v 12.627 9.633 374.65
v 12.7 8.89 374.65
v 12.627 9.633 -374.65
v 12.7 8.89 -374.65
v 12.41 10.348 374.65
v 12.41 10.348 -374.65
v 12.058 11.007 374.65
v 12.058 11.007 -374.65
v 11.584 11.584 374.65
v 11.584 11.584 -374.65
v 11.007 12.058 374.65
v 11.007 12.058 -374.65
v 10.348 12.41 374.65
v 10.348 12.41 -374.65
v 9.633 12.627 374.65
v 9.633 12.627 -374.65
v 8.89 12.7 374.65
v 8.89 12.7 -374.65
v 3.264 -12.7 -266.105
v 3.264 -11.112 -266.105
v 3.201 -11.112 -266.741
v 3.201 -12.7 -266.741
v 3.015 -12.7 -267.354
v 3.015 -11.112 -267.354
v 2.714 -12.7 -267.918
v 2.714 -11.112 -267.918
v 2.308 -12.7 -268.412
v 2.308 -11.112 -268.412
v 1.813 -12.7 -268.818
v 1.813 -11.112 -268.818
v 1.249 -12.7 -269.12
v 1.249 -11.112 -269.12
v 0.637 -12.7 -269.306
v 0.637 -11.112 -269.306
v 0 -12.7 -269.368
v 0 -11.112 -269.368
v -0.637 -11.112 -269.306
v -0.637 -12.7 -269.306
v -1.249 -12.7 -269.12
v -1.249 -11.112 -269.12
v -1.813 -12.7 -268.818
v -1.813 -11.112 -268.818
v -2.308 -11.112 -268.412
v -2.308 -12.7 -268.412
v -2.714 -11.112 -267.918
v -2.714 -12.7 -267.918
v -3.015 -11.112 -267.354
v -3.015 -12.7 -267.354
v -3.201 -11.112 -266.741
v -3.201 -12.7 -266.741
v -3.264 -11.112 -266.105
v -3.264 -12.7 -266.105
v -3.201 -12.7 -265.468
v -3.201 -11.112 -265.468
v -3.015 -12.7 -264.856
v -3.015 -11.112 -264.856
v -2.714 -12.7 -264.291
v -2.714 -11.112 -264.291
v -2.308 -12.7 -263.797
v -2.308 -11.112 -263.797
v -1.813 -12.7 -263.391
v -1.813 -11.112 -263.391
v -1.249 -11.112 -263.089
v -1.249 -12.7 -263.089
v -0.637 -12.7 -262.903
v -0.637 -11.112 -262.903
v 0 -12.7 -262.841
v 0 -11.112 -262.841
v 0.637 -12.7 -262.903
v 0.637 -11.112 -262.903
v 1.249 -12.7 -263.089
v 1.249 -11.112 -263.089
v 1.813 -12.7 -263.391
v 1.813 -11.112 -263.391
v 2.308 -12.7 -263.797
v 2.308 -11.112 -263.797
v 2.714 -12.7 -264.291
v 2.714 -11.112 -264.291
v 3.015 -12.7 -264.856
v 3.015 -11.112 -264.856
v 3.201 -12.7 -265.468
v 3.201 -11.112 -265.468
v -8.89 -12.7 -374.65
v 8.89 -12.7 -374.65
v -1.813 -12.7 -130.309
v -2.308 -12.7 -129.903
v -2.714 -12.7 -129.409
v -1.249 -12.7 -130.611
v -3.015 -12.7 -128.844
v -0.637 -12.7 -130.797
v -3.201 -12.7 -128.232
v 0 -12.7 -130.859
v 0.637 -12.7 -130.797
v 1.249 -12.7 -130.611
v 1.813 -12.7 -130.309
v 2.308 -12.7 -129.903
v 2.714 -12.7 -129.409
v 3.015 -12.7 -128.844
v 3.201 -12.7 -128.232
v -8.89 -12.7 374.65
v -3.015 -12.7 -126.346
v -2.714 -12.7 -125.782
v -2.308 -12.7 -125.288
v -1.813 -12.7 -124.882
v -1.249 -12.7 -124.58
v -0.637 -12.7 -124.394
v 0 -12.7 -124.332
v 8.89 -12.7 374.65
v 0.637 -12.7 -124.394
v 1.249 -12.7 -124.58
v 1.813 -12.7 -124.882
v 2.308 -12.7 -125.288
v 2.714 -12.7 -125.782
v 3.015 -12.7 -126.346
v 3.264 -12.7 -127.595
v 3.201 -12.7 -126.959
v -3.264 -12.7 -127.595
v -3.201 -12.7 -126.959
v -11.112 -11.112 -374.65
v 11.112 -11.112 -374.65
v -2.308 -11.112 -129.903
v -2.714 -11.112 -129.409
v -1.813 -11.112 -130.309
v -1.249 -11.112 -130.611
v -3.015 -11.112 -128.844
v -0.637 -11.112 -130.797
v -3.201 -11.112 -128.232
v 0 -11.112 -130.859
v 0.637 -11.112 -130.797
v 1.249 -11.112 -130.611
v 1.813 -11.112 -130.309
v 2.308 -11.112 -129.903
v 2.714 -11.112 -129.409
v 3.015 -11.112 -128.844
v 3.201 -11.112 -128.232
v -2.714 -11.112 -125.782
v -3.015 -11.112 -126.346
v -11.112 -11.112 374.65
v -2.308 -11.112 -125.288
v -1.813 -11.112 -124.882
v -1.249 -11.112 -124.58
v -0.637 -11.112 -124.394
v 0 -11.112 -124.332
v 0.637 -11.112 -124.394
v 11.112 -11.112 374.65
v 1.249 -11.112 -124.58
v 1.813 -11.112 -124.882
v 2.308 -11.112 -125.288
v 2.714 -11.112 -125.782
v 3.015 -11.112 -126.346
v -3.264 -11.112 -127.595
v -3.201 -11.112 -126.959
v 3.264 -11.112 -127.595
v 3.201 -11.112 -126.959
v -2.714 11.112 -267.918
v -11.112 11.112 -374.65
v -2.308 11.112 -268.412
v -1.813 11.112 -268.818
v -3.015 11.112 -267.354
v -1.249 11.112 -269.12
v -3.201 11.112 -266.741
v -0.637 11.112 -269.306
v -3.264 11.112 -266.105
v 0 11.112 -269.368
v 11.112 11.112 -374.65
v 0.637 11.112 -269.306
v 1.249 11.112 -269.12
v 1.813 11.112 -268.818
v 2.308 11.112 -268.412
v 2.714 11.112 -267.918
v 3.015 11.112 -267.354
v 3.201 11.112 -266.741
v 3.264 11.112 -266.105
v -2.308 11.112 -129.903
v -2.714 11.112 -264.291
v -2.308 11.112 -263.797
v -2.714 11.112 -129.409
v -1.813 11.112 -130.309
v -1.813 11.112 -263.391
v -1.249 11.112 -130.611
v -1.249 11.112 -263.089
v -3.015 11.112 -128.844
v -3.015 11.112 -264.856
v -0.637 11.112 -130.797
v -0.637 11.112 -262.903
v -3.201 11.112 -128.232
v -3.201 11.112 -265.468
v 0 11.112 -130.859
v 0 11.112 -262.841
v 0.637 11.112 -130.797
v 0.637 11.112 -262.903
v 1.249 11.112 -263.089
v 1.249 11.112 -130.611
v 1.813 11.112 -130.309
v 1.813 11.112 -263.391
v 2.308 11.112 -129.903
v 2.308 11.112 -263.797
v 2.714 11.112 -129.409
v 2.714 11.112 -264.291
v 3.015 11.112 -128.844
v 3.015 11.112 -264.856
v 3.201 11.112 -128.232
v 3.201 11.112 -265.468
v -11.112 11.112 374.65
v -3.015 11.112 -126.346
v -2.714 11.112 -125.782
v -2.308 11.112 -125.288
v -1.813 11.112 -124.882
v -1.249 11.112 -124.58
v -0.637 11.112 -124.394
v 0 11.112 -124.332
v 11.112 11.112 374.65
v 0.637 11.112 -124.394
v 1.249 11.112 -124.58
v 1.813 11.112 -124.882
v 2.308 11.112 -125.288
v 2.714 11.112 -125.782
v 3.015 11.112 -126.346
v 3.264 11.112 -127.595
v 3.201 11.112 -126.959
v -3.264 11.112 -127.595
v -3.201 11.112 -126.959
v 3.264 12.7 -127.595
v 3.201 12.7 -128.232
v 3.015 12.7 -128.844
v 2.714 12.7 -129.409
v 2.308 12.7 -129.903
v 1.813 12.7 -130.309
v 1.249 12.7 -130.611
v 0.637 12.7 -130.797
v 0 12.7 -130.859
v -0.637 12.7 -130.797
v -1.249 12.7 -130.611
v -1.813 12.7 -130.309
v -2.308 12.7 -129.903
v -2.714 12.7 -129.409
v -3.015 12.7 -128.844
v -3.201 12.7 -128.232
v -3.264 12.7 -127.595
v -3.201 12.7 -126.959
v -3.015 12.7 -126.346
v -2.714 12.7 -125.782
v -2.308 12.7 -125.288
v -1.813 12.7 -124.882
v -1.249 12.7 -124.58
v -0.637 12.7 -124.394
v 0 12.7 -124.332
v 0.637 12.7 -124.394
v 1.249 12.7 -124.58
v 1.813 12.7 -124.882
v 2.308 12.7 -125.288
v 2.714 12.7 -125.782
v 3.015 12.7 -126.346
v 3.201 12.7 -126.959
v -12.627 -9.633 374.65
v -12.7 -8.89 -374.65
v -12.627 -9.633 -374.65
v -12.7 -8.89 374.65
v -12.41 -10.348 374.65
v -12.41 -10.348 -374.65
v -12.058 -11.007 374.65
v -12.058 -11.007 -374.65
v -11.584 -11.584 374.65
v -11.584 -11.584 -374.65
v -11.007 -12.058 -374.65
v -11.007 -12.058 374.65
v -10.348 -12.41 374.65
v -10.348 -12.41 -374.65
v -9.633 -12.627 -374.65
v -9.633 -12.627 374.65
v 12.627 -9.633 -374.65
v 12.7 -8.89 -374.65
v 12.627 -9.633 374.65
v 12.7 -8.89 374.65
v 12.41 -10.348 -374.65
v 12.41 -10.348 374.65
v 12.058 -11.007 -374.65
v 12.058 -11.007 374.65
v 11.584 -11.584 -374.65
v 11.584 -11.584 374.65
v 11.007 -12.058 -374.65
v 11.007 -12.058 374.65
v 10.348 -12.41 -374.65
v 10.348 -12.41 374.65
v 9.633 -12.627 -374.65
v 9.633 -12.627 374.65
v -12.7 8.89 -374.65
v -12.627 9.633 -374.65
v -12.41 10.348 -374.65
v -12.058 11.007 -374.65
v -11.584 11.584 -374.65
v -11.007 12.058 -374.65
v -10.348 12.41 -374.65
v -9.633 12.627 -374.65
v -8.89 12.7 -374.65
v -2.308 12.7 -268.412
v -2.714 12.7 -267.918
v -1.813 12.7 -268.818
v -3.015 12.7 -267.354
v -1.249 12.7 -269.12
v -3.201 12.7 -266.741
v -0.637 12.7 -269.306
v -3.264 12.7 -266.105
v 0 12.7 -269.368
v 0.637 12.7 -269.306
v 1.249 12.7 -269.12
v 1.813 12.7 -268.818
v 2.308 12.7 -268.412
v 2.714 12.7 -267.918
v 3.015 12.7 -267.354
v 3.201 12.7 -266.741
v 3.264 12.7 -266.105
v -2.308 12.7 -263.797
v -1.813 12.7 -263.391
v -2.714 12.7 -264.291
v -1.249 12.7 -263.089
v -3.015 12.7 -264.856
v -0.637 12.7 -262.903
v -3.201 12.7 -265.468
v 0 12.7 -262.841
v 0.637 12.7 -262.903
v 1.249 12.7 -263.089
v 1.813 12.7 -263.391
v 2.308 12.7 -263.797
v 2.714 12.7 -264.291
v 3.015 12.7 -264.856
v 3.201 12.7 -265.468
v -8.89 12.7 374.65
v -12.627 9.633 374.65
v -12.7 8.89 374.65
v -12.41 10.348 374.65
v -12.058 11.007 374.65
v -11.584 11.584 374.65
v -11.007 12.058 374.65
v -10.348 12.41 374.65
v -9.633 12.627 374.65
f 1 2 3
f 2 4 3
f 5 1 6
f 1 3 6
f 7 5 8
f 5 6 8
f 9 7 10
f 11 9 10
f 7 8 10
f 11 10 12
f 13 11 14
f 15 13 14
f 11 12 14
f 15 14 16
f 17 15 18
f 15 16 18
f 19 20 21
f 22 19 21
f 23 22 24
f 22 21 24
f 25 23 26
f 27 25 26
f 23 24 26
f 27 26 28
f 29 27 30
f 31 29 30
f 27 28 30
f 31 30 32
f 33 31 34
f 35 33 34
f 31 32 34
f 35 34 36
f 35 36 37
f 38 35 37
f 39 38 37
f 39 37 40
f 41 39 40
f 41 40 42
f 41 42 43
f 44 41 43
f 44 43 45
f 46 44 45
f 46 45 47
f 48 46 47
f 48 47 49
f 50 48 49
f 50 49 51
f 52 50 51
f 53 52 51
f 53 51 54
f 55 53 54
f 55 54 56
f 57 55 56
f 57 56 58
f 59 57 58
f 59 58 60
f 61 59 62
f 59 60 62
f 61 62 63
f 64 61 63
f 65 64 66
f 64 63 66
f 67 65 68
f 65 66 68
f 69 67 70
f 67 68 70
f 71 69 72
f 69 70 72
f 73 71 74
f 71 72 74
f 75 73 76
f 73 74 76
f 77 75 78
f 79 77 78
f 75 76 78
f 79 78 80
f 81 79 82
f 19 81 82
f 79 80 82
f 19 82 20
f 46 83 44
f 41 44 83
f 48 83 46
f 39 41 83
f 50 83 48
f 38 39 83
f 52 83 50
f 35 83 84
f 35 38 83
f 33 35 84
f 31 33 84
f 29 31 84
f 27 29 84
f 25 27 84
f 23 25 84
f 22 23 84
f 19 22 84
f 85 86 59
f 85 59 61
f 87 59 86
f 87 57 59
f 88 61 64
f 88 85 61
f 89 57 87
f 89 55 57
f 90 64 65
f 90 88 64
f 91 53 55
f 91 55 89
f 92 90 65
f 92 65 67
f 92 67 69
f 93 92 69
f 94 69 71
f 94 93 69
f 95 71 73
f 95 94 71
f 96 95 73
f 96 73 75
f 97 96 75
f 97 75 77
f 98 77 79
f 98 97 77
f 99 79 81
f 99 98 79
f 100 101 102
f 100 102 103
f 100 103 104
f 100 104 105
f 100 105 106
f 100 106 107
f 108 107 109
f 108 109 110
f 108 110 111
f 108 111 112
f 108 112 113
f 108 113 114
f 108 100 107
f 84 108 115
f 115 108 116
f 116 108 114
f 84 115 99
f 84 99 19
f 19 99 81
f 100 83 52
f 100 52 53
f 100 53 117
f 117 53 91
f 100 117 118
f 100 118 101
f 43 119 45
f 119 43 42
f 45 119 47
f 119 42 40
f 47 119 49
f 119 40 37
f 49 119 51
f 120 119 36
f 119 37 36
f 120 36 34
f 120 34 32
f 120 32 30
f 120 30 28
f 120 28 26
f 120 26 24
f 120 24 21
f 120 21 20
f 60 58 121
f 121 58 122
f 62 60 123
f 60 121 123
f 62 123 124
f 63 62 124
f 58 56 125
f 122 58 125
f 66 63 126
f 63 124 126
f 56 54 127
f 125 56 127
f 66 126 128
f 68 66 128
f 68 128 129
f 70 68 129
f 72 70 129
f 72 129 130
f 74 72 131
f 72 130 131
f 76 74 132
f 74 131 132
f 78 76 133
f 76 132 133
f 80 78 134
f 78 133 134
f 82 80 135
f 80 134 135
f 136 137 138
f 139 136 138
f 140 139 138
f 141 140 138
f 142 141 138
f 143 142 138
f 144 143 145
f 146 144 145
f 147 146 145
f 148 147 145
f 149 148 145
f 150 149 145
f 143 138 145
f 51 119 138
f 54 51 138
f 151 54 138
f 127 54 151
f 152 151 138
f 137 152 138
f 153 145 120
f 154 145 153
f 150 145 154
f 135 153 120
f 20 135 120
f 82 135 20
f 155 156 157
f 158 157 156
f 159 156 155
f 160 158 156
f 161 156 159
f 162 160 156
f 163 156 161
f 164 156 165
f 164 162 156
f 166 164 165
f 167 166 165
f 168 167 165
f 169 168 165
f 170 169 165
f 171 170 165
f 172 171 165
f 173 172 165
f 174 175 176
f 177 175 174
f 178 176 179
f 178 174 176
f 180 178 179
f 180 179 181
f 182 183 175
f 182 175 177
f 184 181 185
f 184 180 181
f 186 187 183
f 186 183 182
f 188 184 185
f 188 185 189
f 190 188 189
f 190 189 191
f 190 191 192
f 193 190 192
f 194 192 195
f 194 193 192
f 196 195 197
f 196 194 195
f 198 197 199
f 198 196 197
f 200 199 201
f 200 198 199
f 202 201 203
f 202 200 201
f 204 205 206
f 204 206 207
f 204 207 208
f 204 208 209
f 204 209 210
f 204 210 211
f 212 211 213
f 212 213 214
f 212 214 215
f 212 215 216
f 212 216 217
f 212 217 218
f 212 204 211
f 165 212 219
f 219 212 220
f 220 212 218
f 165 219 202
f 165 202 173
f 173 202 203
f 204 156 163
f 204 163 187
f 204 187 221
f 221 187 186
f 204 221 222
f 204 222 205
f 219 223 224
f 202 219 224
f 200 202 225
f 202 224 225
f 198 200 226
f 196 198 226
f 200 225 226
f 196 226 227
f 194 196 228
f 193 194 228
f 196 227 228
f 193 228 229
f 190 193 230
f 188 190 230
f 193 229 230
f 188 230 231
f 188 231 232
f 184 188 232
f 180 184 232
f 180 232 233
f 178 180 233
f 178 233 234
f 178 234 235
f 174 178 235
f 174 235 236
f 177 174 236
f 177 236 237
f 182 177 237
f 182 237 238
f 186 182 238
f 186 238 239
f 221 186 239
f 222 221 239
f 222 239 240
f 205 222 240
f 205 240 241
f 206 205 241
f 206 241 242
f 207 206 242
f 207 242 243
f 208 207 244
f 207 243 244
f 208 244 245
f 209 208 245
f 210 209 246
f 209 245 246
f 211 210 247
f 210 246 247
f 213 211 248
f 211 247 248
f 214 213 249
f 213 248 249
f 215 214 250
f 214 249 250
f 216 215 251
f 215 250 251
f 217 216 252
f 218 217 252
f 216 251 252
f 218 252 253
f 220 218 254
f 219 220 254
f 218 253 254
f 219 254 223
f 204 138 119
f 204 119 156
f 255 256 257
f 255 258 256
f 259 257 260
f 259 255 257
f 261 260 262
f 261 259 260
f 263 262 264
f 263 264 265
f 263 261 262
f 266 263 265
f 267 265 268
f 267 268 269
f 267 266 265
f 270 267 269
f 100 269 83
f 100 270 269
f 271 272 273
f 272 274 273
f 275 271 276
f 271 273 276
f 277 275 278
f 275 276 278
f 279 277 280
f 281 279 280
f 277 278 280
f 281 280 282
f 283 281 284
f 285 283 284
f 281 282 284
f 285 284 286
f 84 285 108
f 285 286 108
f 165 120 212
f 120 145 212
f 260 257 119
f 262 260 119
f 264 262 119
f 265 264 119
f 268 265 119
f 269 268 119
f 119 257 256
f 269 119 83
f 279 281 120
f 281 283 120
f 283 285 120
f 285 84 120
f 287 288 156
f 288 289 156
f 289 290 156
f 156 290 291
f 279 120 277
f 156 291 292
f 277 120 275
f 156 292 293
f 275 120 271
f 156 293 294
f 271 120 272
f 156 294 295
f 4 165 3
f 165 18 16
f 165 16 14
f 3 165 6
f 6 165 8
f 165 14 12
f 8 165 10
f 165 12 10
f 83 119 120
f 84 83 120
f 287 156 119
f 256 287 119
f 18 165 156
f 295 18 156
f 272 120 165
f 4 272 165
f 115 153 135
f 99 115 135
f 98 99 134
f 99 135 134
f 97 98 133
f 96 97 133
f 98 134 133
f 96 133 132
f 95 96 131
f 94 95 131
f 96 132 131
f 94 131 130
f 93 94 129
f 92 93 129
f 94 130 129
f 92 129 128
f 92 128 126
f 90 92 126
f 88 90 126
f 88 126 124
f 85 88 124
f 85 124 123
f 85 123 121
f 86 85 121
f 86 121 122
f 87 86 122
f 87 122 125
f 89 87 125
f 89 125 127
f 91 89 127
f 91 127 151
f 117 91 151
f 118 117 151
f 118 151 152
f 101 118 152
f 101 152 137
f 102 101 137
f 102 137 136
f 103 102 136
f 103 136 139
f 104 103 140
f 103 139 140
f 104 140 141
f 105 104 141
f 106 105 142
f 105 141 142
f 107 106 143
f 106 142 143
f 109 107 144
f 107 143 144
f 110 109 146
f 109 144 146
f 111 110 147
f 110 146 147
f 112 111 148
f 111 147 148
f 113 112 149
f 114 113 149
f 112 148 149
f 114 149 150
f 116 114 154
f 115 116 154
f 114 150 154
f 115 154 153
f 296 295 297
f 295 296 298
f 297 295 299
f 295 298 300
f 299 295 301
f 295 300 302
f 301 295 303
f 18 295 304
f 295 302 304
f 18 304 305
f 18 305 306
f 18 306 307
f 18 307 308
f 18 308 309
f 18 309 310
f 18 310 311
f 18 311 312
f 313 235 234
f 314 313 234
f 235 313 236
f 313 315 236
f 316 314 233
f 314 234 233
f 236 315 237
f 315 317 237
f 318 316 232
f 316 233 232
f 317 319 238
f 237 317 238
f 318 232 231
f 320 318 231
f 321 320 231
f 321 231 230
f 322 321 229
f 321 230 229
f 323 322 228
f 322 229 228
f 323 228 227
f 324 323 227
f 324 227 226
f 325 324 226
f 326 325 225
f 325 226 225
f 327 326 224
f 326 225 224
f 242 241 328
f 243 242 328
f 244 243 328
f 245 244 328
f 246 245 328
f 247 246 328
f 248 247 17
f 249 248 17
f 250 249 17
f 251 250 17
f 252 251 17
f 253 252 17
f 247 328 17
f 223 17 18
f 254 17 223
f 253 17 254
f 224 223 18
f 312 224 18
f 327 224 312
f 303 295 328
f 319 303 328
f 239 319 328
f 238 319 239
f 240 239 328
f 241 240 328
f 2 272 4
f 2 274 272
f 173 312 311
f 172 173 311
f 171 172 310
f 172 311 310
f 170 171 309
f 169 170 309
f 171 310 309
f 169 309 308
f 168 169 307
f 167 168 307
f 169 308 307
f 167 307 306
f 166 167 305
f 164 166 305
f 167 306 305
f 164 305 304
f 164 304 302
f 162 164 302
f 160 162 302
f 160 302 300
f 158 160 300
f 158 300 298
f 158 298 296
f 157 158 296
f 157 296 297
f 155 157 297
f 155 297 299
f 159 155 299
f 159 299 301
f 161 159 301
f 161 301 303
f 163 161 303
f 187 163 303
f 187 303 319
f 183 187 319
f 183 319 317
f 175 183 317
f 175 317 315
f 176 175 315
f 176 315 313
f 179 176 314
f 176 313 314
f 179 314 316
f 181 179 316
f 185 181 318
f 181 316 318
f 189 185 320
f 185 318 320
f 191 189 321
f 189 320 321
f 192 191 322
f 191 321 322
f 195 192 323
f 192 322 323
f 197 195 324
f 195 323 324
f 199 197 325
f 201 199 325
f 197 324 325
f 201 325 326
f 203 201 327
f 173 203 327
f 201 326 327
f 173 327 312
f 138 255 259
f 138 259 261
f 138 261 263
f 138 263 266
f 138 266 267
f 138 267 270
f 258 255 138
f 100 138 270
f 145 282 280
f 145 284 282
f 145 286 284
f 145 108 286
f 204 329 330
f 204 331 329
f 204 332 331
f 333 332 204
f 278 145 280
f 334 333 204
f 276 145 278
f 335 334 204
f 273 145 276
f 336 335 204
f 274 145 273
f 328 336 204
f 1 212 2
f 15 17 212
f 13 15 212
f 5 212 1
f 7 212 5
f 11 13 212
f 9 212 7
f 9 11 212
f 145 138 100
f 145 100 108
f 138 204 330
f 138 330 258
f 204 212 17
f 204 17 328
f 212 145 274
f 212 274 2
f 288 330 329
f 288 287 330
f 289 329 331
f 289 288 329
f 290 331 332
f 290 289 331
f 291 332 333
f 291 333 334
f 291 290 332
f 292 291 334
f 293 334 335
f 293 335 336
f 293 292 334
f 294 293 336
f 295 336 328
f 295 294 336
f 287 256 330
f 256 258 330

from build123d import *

# Parameters (mm, degrees)
SKETCH4_W               = 25.4
SKETCH4_H               = 25.4
SKETCH4_W_2             = 22.225
SKETCH4_H_2             = 22.225
BOSS_EXTRUDE2_DEPTH     = 374.65
FILLET1_R               = 3.81
SKETCH5_R               = 3.2639
CUT_EXTRUDE1_DEPTH      = 1
CUT_EXTRUDE1_DEPTH_BACK = 26.4


with BuildPart() as part:
    # Sketch4 → Boss-Extrude2 (new body, symmetric)
    with BuildSketch(Plane.XY):
        Rectangle(SKETCH4_W, SKETCH4_H)
        Rectangle(SKETCH4_W_2, SKETCH4_H_2, mode=Mode.SUBTRACT)
    extrude(amount=BOSS_EXTRUDE2_DEPTH, both=True)

    # Fillet1
    fillet1_edges = [part.edges().sort_by_distance(p)[0] for p in [
        (12.7, -12.7, 0),
        (-12.7, -12.7, 0),
        (-12.7, 12.7, 0),
        (12.7, 12.7, 0),
    ]]
    fillet(fillet1_edges, radius=FILLET1_R)

    # Sketch5 → Cut-Extrude1 (cut, two sides)
    with BuildSketch(Plane(origin=(0, 12.7, 0), x_dir=(1, 0, 0), z_dir=(0, 1, 0))) as cut_extrude1_sk:
        with Locations((0, 127.59545203)):
            Circle(SKETCH5_R)
        with Locations((0, 266.10454797)):
            Circle(SKETCH5_R)
    extrude(amount=CUT_EXTRUDE1_DEPTH, mode=Mode.SUBTRACT)
    extrude(cut_extrude1_sk.sketch, amount=-CUT_EXTRUDE1_DEPTH_BACK, mode=Mode.SUBTRACT)


solid = part.part
